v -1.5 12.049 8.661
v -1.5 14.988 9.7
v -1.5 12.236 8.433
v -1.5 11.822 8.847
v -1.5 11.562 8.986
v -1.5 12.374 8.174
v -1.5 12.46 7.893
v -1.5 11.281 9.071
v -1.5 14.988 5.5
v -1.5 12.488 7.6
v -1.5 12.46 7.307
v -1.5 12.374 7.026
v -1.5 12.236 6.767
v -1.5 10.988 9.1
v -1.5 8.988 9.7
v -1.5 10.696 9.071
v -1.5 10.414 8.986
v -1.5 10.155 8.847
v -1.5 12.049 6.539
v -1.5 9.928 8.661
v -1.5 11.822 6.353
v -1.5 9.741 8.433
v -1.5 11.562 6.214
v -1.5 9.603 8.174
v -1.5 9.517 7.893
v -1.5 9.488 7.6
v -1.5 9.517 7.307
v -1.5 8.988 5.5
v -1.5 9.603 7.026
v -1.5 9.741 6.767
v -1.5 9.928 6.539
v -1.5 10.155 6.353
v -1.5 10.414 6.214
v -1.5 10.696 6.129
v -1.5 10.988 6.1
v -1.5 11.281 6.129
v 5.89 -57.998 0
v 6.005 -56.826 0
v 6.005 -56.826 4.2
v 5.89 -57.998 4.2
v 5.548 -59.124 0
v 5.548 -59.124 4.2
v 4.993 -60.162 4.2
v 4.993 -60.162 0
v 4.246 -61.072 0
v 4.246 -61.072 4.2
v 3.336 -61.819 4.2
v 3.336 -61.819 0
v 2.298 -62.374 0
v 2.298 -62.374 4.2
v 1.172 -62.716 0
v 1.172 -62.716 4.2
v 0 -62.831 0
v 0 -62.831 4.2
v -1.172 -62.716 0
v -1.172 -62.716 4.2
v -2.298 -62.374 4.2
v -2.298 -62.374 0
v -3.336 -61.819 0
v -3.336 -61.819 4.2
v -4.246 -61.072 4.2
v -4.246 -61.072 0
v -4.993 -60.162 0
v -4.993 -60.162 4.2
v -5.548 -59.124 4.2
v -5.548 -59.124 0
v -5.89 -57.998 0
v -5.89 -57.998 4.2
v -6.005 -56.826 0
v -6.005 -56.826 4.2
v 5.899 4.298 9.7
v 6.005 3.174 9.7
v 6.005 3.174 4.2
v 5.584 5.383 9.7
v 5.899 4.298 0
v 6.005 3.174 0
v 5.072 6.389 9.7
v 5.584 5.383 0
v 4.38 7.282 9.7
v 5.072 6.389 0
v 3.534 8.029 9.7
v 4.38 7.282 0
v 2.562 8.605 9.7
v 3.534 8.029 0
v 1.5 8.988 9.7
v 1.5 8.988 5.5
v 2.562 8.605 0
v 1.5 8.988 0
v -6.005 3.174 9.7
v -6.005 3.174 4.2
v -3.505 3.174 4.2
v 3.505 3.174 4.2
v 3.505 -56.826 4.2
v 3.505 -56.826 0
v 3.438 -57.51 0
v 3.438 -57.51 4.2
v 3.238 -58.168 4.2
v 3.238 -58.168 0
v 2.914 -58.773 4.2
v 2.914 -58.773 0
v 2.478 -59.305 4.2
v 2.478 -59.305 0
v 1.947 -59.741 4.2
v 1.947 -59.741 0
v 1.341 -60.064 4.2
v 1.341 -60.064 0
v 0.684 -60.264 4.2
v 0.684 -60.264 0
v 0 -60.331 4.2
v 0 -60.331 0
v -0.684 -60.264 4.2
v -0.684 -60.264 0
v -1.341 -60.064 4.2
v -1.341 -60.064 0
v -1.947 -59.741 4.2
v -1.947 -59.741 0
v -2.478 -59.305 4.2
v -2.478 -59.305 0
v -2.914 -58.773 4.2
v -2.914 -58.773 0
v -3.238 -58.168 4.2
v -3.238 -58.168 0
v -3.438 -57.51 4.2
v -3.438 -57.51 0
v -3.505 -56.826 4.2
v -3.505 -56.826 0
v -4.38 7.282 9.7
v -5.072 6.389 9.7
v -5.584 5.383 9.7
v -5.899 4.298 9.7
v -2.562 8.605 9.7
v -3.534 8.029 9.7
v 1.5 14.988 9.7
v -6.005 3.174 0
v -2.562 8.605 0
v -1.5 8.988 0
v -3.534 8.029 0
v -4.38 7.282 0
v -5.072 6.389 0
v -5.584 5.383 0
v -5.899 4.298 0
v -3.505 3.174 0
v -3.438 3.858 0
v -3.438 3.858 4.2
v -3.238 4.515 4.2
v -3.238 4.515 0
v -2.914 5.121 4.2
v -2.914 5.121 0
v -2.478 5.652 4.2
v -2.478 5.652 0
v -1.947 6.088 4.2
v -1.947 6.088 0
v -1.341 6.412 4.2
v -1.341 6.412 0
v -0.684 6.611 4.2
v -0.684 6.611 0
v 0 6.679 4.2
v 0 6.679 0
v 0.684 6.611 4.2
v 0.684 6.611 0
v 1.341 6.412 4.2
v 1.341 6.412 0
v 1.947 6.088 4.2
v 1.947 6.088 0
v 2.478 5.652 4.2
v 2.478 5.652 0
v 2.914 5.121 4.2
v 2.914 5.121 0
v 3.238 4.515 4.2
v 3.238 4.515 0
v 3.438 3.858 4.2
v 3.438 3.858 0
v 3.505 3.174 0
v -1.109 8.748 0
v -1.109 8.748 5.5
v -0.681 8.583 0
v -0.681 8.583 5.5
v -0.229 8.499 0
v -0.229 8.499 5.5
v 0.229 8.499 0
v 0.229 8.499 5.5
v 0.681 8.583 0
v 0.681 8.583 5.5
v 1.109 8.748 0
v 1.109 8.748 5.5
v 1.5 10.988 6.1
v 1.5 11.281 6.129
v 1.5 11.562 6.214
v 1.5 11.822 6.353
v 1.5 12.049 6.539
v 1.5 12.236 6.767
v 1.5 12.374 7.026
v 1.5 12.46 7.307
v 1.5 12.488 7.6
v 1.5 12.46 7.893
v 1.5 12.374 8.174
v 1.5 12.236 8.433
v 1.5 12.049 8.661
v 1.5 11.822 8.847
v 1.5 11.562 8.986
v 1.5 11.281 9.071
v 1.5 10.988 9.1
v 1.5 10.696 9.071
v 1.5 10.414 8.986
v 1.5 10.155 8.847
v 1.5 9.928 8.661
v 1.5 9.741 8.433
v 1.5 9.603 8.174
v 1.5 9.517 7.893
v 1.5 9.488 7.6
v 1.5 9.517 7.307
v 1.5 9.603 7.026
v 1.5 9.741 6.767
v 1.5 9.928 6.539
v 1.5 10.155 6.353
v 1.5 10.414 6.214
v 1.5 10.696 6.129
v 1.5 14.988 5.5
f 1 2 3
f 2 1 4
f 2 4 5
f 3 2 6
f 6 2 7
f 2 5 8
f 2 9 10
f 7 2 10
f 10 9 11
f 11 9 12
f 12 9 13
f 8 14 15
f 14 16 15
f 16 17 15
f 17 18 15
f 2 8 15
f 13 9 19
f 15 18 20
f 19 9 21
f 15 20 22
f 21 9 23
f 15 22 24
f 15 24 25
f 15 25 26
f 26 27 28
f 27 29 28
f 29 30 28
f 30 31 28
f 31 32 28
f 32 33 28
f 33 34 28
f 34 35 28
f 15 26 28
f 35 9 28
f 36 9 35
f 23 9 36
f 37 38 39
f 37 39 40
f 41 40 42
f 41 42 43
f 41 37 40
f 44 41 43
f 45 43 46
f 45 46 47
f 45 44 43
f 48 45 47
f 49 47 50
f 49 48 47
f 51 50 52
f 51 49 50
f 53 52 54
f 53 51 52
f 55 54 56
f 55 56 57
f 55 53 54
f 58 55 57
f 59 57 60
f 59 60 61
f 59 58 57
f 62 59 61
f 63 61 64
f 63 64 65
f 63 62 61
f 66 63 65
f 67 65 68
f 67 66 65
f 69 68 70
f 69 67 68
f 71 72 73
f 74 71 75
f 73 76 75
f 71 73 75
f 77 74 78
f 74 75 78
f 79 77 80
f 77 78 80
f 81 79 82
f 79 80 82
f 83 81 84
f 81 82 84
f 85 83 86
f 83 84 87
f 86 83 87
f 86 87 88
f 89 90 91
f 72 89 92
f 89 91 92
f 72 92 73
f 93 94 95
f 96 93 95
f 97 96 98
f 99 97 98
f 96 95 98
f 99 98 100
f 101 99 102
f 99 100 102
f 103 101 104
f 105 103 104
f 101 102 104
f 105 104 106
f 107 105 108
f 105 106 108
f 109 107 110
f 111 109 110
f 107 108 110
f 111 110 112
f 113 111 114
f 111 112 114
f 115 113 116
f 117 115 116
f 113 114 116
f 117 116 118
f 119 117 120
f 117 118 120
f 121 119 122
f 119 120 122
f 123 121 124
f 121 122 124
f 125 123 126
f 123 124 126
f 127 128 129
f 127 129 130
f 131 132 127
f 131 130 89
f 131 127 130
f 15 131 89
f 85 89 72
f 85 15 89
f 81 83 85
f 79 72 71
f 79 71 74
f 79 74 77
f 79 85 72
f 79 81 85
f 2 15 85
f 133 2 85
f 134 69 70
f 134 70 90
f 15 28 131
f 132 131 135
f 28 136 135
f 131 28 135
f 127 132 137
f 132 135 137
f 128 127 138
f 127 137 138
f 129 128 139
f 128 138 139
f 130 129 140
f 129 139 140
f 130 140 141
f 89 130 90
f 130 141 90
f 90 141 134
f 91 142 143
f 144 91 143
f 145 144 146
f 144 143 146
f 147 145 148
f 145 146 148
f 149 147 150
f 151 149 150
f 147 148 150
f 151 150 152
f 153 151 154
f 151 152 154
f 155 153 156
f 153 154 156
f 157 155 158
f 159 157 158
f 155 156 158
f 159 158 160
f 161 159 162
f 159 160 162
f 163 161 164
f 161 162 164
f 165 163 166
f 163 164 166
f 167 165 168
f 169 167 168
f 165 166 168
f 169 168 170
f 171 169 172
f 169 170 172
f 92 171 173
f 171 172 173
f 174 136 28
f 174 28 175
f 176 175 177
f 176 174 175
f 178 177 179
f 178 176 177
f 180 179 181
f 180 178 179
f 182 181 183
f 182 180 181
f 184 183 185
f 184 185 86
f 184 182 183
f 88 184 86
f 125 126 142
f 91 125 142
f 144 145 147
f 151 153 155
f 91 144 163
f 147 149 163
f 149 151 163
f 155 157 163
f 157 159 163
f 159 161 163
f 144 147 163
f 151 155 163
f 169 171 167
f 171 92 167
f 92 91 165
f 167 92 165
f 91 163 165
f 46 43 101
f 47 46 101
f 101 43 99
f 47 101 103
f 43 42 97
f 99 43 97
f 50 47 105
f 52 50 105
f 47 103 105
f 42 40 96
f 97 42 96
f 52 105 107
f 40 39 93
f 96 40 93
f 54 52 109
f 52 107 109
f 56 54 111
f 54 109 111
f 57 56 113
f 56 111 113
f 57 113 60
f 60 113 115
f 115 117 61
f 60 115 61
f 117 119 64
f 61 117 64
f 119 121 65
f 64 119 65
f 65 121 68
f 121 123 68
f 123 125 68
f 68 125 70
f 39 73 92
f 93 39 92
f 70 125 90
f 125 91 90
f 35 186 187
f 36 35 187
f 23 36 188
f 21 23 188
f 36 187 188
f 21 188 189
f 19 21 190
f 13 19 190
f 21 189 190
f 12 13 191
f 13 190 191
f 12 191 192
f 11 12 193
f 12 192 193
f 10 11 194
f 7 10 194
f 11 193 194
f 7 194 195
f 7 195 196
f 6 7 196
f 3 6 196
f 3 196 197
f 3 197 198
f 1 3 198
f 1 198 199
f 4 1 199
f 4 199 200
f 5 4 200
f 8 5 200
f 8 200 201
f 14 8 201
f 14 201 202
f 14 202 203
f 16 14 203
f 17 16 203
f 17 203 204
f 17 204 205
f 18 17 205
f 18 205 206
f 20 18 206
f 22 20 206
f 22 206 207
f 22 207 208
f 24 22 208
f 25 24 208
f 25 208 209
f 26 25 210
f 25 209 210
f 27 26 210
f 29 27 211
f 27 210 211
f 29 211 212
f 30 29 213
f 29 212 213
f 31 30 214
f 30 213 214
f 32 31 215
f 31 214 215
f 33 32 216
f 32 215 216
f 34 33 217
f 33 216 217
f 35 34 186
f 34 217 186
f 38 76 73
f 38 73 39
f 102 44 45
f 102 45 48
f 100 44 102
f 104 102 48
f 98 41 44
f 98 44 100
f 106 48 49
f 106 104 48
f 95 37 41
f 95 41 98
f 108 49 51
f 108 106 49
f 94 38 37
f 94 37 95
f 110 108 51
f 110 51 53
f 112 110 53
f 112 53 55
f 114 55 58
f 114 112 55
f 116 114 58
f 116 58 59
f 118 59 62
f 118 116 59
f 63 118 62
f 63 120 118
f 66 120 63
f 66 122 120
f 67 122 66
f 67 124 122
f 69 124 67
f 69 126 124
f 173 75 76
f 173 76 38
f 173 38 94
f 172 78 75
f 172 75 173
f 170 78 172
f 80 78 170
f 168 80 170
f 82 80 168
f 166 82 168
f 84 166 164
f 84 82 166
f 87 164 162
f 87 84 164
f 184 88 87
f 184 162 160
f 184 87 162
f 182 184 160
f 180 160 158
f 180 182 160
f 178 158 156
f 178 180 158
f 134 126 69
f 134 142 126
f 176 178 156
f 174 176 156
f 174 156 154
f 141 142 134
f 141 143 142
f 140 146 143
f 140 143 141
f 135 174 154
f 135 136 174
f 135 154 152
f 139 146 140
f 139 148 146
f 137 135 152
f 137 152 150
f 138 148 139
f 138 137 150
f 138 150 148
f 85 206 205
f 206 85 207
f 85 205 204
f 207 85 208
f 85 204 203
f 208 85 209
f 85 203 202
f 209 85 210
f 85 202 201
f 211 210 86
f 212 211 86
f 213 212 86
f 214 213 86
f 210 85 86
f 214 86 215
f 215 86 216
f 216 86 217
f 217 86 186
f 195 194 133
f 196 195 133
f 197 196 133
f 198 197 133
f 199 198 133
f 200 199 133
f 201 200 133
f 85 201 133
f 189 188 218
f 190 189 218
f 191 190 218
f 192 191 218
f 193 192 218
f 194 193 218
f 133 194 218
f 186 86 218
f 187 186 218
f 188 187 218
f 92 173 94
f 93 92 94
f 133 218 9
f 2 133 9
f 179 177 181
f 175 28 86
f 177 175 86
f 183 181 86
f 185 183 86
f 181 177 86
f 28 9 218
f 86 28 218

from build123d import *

# Parameters (mm, degrees)
EXTRUDE_1_DEPTH     = 4.2
EXTRUDE_2_DEPTH     = 5.5
CUT_EXTRUDE_1_DEPTH = 5.5
SKETCH_4_R          = 1.5
CUT_EXTRUDE_2_DEPTH = 10


with BuildPart() as part:
    # 草图1 → 凸台-拉伸1 (new body)
    with BuildSketch(Plane.XY):
        with BuildLine():
            Line((6.005, 3.173780296), (6.005, -56.826219704))
            ThreePointArc((6.005, -56.826219704), (0, -62.831219704), (-6.005, -56.826219704))
            Line((-6.005, -56.826219704), (-6.005, 3.173780296))
            ThreePointArc((-6.005, 3.173780296), (-4.746974036, 6.851587047), (-1.5, 8.988419149))
            Line((-1.5, 8.988419149), (-1.5, 14.988419149))
            Line((-1.5, 14.988419149), (1.5, 14.988419149))
            Line((1.5, 14.988419149), (1.5, 8.988419149))
            ThreePointArc((1.5, 8.988419149), (4.746974036, 6.851587047), (6.005, 3.173780296))
        make_face()
        with BuildLine():
            Line((3.505, 3.173780296), (3.505, -56.826219704))
            ThreePointArc((3.505, -56.826219704), (0, -60.331219704), (-3.505, -56.826219704))
            Line((-3.505, -56.826219704), (-3.505, 3.173780296))
            ThreePointArc((-3.505, 3.173780296), (0, 6.678780296), (3.505, 3.173780296))
        make_face(mode=Mode.SUBTRACT)
    extrude(amount=EXTRUDE_1_DEPTH)

    # 草图2 → 凸台-拉伸2 (add)
    with BuildSketch(Plane.XY.offset(4.2)):
        with BuildLine():
            Line((1.5, 14.988419149), (-1.5, 14.988419149))
            Line((-1.5, 14.988419149), (-1.5, 8.988419149))
            ThreePointArc((-1.5, 8.988419149), (-4.746974036, 6.851587047), (-6.005, 3.173780296))
            Line((-6.005, 3.173780296), (6.005, 3.173780296))
            ThreePointArc((6.005, 3.173780296), (4.746974036, 6.851587047), (1.5, 8.988419149))
            Line((1.5, 8.988419149), (1.5, 14.988419149))
        make_face()
    extrude(amount=EXTRUDE_2_DEPTH)

    # 草图3 → 切除-拉伸1 (cut)
    with BuildSketch(Plane(origin=(0, 0, 0), x_dir=(-1, 0, 0), z_dir=(0, 0, -1))):
        with BuildLine():
            Line((-1.5, 14.988419149), (1.5, 14.988419149))
            Line((1.5, 14.988419149), (1.5, 8.988419149))
            ThreePointArc((1.5, 8.988419149), (0, 8.488419149), (-1.5, 8.988419149))
            Line((-1.5, 8.988419149), (-1.5, 14.988419149))
        make_face()
    extrude(amount=-CUT_EXTRUDE_1_DEPTH, mode=Mode.SUBTRACT)

    # 草图4 → 切除-拉伸2 (cut)
    with BuildSketch(Plane(origin=(1.5, 0, 0), x_dir=(0, 0, -1), z_dir=(1, 0, 0))):
        with Locations((-7.6, 10.988419149)):
            Circle(SKETCH_4_R)
    extrude(amount=-CUT_EXTRUDE_2_DEPTH, mode=Mode.SUBTRACT)


solid = part.part
